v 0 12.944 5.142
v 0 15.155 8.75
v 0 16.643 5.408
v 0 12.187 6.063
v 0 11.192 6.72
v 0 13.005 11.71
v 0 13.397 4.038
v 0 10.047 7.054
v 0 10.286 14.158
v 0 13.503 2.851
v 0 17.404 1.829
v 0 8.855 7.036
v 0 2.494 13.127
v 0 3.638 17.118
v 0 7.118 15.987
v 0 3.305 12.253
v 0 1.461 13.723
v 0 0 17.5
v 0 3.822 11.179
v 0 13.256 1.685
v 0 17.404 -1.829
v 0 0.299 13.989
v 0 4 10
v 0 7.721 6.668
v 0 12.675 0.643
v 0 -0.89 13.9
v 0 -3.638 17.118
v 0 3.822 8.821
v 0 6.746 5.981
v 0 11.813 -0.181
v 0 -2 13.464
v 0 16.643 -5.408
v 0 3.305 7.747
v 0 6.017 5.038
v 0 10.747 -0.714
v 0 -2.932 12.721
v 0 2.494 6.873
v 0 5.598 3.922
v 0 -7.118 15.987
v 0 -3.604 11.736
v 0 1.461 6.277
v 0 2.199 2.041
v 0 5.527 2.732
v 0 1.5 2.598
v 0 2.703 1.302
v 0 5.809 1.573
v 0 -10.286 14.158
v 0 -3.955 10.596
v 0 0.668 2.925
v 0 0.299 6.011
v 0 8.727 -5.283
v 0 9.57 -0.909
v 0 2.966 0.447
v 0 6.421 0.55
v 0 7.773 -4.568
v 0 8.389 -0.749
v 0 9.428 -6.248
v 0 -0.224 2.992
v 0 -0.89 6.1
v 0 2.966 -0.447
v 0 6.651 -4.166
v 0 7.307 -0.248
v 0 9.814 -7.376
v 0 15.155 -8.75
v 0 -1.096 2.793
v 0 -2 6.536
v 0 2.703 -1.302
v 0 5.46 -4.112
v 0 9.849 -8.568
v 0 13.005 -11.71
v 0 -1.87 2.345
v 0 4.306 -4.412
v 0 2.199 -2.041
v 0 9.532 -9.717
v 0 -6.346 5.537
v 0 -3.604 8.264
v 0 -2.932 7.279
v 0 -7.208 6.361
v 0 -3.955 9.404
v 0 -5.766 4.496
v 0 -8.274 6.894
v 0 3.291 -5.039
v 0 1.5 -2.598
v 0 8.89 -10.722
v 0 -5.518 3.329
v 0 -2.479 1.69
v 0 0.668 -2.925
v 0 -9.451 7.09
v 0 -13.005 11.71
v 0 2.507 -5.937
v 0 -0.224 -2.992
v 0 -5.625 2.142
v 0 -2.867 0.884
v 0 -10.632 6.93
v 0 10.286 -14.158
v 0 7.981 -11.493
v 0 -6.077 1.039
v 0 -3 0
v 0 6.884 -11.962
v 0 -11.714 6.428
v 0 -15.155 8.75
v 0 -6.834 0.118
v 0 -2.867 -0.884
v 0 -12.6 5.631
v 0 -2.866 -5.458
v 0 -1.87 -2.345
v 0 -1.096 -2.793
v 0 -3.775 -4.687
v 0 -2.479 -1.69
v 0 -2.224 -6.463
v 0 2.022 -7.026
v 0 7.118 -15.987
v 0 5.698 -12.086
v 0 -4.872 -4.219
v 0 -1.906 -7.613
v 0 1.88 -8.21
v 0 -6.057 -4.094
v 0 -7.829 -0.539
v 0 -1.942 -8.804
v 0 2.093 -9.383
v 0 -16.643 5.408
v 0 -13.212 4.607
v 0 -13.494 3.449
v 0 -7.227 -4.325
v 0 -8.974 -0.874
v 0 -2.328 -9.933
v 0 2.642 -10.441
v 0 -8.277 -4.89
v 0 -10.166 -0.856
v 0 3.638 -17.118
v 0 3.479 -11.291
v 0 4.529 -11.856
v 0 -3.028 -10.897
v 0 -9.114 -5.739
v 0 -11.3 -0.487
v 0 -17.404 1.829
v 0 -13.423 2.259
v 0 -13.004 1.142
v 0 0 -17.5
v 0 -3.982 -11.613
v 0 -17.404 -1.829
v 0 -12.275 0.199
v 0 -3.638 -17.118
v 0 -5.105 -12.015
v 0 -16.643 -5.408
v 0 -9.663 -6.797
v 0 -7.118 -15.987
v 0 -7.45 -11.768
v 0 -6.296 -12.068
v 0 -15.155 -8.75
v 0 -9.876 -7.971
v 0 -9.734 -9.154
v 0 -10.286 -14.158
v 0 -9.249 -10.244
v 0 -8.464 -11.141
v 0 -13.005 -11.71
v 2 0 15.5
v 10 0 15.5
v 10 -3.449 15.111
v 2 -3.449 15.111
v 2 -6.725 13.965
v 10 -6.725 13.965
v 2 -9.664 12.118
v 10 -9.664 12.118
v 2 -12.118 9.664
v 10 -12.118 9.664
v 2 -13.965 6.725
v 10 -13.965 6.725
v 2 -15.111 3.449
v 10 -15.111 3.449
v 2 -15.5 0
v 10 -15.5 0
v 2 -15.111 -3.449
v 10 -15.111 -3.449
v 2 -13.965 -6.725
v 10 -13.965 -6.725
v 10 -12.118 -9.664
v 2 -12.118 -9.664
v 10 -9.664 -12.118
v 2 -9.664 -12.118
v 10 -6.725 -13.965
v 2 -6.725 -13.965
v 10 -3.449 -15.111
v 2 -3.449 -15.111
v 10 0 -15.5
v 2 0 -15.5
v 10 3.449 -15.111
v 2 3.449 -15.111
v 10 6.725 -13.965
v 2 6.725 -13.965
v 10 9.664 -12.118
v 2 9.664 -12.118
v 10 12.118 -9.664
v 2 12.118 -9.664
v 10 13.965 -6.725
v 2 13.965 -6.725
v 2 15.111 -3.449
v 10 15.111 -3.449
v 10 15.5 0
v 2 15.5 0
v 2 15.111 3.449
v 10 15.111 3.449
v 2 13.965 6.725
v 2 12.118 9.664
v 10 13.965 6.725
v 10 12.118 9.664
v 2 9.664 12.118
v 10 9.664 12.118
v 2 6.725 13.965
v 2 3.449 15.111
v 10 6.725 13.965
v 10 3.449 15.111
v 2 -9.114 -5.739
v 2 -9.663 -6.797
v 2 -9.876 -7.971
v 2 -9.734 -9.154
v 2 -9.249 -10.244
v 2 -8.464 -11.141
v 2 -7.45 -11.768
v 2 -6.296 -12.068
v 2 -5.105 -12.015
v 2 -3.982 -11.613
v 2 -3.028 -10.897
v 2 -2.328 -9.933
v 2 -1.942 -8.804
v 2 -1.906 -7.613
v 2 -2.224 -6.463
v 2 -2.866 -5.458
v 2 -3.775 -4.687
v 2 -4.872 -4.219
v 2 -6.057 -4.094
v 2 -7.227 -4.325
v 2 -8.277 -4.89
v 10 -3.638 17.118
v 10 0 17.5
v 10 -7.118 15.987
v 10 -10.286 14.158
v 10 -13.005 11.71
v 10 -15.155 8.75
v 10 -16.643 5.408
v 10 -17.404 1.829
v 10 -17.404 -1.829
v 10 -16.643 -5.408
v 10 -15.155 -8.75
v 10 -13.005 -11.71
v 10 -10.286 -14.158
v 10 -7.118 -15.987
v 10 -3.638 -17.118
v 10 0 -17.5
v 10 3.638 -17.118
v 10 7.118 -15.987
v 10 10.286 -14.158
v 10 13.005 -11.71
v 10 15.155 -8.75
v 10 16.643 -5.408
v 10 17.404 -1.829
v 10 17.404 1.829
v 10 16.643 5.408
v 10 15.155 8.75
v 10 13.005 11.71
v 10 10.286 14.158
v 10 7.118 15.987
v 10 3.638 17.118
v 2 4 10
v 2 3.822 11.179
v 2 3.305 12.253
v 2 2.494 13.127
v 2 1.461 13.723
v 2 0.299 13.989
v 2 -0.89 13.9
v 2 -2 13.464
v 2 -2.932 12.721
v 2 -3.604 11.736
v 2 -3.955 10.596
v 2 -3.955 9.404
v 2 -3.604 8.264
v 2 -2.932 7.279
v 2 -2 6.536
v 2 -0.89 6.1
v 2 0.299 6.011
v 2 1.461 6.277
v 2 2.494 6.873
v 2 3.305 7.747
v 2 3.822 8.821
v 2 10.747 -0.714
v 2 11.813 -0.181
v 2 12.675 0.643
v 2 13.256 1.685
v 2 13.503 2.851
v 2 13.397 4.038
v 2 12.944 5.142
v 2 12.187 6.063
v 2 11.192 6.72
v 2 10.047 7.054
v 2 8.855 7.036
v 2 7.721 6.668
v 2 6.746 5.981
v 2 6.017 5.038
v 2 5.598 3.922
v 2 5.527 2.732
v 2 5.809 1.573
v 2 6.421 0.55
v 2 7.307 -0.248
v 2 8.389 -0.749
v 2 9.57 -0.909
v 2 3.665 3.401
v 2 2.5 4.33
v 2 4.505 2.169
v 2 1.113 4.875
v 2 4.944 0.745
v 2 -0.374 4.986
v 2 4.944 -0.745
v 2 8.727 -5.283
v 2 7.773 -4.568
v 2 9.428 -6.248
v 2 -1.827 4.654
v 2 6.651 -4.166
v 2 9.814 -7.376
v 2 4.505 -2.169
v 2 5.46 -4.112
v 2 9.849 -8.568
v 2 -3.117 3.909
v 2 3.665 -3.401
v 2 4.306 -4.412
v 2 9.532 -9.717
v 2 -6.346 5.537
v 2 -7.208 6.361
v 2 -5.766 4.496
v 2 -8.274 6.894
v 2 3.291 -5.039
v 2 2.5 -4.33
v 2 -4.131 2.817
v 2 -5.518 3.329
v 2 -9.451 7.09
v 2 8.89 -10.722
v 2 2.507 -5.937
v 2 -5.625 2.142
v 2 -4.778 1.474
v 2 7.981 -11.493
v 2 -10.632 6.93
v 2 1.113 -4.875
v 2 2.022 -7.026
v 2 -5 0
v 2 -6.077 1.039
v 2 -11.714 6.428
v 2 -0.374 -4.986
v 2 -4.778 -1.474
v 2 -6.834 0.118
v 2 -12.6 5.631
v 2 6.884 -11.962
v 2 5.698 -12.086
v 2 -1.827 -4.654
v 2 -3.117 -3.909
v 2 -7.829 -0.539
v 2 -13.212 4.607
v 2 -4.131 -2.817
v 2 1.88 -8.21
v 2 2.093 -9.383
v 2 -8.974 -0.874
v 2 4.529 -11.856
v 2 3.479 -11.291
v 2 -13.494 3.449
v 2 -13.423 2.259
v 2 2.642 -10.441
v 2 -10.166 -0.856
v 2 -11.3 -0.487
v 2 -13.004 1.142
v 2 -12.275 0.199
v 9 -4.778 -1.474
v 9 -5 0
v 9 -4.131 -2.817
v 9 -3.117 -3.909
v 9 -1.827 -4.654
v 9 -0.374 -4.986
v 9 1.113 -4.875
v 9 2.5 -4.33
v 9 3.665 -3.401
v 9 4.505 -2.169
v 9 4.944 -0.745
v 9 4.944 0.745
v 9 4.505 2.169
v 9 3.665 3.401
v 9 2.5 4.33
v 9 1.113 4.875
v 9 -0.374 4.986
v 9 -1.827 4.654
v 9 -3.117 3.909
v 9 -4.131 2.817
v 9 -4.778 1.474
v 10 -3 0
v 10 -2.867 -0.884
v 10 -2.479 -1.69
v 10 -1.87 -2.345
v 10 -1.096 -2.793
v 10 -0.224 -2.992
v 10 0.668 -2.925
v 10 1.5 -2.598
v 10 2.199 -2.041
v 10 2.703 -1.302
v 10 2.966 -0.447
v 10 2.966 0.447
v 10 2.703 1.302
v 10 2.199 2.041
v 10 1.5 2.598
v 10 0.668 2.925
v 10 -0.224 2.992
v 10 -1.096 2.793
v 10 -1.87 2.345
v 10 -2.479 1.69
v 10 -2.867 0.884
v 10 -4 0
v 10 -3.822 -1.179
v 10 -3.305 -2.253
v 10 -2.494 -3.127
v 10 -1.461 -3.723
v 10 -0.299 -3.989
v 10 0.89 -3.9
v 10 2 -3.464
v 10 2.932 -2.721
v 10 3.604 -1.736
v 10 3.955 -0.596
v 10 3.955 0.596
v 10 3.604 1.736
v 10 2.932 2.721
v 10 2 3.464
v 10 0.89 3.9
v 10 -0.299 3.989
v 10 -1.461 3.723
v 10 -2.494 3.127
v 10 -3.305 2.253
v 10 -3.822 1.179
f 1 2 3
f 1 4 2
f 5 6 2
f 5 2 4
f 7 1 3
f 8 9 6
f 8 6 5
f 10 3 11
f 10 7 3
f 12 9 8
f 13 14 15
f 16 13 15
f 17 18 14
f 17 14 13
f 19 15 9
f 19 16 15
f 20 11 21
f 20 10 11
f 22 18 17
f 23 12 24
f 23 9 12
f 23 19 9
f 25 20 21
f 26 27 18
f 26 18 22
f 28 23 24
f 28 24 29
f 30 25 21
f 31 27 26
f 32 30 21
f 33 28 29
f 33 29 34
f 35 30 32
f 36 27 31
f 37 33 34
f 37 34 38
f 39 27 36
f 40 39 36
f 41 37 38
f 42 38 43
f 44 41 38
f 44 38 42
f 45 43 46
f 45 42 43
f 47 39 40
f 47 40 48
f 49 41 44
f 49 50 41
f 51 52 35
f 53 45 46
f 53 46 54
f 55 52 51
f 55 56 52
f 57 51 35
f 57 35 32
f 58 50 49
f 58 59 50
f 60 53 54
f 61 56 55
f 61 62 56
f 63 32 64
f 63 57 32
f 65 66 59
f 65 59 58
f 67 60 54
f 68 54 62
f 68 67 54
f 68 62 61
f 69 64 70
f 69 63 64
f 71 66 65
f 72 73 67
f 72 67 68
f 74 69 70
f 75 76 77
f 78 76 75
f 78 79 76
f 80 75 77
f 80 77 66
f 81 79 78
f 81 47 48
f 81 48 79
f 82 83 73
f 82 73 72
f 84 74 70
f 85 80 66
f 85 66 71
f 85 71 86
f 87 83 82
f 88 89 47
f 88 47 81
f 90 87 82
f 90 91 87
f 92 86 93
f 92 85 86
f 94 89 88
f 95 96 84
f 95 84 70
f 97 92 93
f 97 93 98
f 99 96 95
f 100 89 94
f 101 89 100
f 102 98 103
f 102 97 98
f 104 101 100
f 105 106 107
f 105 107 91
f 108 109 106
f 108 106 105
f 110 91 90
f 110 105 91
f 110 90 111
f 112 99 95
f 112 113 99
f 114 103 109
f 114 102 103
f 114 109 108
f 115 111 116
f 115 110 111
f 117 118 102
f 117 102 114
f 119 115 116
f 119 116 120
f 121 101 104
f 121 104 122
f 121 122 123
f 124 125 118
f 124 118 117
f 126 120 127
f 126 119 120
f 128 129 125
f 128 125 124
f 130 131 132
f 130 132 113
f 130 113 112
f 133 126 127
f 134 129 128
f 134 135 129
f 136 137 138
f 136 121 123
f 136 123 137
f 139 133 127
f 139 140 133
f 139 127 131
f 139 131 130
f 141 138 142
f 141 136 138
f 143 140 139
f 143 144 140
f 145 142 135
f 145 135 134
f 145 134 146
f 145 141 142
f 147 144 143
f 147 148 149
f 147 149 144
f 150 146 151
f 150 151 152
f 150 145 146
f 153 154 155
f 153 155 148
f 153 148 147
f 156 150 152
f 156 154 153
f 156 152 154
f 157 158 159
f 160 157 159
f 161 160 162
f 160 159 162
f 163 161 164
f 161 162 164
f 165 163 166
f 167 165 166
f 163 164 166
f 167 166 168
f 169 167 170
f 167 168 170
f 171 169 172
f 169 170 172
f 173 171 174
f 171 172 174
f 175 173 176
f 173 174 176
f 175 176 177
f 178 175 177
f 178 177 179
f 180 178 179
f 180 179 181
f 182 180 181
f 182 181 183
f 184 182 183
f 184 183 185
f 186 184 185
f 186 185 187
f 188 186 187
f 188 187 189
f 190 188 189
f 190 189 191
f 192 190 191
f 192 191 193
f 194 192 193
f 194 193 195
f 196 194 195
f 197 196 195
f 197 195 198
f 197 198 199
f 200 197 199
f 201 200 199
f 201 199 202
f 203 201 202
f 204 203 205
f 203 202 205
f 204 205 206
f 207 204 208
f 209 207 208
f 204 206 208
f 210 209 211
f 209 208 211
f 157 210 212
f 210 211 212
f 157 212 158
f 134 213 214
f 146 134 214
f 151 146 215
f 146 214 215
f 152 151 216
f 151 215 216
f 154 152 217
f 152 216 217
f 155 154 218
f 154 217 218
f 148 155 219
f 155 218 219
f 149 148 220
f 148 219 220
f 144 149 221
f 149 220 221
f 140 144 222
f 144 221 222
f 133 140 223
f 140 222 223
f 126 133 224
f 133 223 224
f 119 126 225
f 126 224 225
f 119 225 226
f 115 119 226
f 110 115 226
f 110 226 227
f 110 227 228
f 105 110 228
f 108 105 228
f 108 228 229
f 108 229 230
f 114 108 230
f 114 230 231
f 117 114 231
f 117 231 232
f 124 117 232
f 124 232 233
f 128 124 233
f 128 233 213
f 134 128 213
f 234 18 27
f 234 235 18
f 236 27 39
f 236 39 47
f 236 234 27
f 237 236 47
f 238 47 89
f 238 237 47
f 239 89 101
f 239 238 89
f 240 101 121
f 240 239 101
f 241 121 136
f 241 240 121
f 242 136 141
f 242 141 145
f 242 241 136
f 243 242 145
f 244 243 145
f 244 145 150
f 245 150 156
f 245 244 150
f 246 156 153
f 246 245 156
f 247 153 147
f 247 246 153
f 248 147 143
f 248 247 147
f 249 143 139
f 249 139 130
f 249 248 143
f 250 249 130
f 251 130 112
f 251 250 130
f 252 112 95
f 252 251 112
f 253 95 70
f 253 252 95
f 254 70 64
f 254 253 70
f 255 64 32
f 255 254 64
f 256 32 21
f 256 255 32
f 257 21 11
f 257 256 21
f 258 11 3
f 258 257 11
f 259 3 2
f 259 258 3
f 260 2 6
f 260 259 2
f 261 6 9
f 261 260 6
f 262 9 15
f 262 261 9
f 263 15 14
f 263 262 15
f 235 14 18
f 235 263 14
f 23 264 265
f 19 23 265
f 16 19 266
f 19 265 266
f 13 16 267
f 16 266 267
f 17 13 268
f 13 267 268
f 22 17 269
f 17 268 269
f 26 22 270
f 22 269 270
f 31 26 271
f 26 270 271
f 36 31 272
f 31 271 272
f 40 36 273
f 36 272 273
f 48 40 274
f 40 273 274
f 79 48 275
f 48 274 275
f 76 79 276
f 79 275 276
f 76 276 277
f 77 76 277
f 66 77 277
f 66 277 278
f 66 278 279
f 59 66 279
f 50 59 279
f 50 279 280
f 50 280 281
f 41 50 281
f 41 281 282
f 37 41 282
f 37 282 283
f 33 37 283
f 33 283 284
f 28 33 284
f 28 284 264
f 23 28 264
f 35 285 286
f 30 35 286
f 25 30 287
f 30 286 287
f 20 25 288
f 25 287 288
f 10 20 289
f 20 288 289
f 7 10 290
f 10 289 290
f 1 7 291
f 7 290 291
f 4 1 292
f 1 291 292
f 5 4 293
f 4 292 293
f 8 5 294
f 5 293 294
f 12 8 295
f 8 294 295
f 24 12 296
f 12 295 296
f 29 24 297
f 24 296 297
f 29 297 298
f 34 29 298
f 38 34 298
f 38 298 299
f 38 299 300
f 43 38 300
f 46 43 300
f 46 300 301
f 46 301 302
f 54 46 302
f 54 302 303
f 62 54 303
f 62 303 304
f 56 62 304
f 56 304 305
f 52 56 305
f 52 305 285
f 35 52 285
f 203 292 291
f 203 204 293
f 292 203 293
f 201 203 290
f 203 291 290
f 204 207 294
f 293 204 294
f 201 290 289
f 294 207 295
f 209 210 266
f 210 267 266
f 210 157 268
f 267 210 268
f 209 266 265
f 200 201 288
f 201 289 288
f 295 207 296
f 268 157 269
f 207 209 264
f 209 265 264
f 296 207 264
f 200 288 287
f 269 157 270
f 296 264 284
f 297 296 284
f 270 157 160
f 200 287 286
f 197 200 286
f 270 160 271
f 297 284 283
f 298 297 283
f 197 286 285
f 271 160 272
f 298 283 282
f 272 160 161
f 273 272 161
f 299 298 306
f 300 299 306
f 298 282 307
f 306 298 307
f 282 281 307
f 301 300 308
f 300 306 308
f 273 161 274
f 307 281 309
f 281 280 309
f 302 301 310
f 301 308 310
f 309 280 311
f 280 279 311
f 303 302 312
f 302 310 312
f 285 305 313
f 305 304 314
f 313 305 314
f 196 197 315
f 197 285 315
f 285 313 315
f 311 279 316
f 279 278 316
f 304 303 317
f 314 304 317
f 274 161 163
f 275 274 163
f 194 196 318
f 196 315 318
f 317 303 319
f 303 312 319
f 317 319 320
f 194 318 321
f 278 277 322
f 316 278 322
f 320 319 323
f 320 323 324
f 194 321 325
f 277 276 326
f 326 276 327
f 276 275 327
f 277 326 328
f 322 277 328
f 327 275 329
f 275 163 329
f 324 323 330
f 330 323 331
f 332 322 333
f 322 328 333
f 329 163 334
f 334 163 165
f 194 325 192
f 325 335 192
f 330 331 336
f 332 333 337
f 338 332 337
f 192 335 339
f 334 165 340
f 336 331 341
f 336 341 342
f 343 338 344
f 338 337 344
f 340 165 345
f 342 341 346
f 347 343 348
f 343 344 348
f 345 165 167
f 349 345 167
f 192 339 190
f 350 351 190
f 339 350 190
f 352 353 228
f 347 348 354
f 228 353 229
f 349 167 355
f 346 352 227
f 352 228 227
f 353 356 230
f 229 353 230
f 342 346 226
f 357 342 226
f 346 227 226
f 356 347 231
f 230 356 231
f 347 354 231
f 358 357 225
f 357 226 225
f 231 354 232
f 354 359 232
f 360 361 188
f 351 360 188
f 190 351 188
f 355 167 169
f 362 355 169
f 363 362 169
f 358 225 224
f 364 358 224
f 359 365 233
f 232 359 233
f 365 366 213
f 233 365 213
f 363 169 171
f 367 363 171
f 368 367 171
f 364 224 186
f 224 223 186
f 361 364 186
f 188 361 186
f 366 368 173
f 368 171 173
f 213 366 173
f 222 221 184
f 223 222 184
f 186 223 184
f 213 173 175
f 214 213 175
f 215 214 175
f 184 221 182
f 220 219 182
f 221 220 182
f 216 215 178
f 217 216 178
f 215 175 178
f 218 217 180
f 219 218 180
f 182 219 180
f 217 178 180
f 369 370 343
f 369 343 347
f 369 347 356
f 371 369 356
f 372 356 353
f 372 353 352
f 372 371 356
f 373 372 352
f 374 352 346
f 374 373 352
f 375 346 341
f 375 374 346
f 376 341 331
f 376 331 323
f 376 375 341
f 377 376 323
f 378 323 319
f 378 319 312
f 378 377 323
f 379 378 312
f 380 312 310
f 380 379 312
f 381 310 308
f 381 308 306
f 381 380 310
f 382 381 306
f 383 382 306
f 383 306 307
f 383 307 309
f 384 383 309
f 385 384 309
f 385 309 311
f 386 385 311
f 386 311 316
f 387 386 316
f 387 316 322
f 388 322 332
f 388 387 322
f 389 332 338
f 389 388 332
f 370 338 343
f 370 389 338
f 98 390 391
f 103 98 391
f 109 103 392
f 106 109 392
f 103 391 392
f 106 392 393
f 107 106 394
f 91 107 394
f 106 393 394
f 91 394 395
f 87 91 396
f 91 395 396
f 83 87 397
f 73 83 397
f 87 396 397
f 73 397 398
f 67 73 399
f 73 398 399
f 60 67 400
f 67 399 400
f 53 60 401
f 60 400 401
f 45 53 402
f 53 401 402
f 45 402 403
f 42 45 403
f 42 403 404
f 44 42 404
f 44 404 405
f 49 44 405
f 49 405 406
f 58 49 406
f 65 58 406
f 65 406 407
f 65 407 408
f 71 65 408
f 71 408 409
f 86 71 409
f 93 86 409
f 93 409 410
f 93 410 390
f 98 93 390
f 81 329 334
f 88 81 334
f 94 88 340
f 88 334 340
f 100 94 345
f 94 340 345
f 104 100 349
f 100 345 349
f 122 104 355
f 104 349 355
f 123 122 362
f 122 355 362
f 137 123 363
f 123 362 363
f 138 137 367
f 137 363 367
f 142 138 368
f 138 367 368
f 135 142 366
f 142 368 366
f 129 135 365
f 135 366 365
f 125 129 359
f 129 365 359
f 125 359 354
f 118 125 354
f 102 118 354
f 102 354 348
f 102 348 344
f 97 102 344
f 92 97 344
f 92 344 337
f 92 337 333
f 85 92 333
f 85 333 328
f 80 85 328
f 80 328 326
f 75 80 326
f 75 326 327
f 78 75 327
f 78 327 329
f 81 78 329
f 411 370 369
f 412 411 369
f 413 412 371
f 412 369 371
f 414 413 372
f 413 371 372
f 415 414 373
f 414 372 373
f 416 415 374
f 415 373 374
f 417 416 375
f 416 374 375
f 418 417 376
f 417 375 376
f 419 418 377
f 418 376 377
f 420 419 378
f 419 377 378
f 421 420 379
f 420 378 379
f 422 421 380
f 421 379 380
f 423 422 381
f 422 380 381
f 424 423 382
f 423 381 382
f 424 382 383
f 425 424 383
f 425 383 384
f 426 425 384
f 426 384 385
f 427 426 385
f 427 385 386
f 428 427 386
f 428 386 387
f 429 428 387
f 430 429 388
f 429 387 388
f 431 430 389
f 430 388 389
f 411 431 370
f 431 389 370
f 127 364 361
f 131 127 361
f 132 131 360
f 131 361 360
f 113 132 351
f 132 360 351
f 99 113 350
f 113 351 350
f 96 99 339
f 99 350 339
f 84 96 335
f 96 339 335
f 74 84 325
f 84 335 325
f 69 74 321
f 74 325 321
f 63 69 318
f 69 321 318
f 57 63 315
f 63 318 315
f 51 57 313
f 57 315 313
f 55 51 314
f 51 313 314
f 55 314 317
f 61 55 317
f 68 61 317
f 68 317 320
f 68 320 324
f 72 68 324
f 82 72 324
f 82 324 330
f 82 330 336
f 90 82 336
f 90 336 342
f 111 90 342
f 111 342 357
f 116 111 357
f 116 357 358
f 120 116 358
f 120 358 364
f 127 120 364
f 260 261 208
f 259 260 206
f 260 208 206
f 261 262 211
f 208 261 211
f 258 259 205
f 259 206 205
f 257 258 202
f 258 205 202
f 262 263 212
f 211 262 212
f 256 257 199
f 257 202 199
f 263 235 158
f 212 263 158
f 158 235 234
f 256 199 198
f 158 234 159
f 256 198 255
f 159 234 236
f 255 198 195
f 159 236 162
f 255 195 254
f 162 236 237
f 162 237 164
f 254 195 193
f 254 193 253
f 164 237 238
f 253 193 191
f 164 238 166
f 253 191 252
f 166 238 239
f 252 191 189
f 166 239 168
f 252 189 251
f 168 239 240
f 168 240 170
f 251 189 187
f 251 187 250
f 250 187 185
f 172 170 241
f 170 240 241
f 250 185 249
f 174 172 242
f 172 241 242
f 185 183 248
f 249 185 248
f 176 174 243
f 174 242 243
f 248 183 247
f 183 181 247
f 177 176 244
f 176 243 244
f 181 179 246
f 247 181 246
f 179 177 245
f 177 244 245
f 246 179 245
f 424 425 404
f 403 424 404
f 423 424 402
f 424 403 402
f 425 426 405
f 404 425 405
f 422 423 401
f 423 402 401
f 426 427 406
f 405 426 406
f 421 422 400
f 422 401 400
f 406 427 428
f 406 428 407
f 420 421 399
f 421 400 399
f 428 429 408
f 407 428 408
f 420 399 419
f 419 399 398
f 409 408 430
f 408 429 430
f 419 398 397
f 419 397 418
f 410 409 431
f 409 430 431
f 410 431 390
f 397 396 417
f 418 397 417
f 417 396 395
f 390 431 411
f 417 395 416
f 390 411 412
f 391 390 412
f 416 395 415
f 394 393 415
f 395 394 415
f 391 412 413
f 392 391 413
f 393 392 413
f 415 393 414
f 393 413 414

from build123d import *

# Parameters (mm, degrees)
F0_W            = 10
F0_H            = 17.5
F3_D            = 6
F4_T            = -2
F6_D            = 8
F6_COPIES_COUNT = 5
F7_SIZE         = 1


# Not quite as in the source:
# - a pattern or mirror of a feature is missing from the dataset's text; its kind, count and spacing are read off the source's solid


with BuildPart() as f1:
    # F0 (on Front) → F1 (revolve)
    with BuildSketch(Plane.XZ):
        with Locations((5, 8.75)):
            Rectangle(F0_W, F0_H)
    revolve(axis=Axis((5, 0, 0), (1, 0, 0)))

    # F3 (through all)
    with Locations(Plane(origin=(0, 0, 0), x_dir=(0, 1, 0), z_dir=(-1, 0, 0))):
        with Locations((0, 0)):
            Hole(F3_D / 2)

    # F4
    f4_openings = [f1.faces().sort_by_distance(p)[0] for p in [
        (10, 0, -17.005025),
    ]]
    offset(amount=F4_T, openings=f4_openings)

    # F6 (through all)
    with Locations(Plane(origin=(0, 0, 0), x_dir=(0, -1, 0), z_dir=(-1, 0, 0))):
        with Locations((0, 10)):
            f6 = Hole(F6_D / 2)

    # F6_copies: F6 ×5 about axis
    f6_copies_axis = Axis((0, 0, 0), (1, 0, 0))
    for i in range(1, F6_COPIES_COUNT):
        add(f6.rotate(f6_copies_axis, i * 360 / F6_COPIES_COUNT), mode=Mode.SUBTRACT)

    # F7
    f7_edges = [f1.edges().sort_by_distance(p)[0] for p in [
        (10, -5, 0),
    ]]
    chamfer(f7_edges, length=F7_SIZE)


solid = f1.part
